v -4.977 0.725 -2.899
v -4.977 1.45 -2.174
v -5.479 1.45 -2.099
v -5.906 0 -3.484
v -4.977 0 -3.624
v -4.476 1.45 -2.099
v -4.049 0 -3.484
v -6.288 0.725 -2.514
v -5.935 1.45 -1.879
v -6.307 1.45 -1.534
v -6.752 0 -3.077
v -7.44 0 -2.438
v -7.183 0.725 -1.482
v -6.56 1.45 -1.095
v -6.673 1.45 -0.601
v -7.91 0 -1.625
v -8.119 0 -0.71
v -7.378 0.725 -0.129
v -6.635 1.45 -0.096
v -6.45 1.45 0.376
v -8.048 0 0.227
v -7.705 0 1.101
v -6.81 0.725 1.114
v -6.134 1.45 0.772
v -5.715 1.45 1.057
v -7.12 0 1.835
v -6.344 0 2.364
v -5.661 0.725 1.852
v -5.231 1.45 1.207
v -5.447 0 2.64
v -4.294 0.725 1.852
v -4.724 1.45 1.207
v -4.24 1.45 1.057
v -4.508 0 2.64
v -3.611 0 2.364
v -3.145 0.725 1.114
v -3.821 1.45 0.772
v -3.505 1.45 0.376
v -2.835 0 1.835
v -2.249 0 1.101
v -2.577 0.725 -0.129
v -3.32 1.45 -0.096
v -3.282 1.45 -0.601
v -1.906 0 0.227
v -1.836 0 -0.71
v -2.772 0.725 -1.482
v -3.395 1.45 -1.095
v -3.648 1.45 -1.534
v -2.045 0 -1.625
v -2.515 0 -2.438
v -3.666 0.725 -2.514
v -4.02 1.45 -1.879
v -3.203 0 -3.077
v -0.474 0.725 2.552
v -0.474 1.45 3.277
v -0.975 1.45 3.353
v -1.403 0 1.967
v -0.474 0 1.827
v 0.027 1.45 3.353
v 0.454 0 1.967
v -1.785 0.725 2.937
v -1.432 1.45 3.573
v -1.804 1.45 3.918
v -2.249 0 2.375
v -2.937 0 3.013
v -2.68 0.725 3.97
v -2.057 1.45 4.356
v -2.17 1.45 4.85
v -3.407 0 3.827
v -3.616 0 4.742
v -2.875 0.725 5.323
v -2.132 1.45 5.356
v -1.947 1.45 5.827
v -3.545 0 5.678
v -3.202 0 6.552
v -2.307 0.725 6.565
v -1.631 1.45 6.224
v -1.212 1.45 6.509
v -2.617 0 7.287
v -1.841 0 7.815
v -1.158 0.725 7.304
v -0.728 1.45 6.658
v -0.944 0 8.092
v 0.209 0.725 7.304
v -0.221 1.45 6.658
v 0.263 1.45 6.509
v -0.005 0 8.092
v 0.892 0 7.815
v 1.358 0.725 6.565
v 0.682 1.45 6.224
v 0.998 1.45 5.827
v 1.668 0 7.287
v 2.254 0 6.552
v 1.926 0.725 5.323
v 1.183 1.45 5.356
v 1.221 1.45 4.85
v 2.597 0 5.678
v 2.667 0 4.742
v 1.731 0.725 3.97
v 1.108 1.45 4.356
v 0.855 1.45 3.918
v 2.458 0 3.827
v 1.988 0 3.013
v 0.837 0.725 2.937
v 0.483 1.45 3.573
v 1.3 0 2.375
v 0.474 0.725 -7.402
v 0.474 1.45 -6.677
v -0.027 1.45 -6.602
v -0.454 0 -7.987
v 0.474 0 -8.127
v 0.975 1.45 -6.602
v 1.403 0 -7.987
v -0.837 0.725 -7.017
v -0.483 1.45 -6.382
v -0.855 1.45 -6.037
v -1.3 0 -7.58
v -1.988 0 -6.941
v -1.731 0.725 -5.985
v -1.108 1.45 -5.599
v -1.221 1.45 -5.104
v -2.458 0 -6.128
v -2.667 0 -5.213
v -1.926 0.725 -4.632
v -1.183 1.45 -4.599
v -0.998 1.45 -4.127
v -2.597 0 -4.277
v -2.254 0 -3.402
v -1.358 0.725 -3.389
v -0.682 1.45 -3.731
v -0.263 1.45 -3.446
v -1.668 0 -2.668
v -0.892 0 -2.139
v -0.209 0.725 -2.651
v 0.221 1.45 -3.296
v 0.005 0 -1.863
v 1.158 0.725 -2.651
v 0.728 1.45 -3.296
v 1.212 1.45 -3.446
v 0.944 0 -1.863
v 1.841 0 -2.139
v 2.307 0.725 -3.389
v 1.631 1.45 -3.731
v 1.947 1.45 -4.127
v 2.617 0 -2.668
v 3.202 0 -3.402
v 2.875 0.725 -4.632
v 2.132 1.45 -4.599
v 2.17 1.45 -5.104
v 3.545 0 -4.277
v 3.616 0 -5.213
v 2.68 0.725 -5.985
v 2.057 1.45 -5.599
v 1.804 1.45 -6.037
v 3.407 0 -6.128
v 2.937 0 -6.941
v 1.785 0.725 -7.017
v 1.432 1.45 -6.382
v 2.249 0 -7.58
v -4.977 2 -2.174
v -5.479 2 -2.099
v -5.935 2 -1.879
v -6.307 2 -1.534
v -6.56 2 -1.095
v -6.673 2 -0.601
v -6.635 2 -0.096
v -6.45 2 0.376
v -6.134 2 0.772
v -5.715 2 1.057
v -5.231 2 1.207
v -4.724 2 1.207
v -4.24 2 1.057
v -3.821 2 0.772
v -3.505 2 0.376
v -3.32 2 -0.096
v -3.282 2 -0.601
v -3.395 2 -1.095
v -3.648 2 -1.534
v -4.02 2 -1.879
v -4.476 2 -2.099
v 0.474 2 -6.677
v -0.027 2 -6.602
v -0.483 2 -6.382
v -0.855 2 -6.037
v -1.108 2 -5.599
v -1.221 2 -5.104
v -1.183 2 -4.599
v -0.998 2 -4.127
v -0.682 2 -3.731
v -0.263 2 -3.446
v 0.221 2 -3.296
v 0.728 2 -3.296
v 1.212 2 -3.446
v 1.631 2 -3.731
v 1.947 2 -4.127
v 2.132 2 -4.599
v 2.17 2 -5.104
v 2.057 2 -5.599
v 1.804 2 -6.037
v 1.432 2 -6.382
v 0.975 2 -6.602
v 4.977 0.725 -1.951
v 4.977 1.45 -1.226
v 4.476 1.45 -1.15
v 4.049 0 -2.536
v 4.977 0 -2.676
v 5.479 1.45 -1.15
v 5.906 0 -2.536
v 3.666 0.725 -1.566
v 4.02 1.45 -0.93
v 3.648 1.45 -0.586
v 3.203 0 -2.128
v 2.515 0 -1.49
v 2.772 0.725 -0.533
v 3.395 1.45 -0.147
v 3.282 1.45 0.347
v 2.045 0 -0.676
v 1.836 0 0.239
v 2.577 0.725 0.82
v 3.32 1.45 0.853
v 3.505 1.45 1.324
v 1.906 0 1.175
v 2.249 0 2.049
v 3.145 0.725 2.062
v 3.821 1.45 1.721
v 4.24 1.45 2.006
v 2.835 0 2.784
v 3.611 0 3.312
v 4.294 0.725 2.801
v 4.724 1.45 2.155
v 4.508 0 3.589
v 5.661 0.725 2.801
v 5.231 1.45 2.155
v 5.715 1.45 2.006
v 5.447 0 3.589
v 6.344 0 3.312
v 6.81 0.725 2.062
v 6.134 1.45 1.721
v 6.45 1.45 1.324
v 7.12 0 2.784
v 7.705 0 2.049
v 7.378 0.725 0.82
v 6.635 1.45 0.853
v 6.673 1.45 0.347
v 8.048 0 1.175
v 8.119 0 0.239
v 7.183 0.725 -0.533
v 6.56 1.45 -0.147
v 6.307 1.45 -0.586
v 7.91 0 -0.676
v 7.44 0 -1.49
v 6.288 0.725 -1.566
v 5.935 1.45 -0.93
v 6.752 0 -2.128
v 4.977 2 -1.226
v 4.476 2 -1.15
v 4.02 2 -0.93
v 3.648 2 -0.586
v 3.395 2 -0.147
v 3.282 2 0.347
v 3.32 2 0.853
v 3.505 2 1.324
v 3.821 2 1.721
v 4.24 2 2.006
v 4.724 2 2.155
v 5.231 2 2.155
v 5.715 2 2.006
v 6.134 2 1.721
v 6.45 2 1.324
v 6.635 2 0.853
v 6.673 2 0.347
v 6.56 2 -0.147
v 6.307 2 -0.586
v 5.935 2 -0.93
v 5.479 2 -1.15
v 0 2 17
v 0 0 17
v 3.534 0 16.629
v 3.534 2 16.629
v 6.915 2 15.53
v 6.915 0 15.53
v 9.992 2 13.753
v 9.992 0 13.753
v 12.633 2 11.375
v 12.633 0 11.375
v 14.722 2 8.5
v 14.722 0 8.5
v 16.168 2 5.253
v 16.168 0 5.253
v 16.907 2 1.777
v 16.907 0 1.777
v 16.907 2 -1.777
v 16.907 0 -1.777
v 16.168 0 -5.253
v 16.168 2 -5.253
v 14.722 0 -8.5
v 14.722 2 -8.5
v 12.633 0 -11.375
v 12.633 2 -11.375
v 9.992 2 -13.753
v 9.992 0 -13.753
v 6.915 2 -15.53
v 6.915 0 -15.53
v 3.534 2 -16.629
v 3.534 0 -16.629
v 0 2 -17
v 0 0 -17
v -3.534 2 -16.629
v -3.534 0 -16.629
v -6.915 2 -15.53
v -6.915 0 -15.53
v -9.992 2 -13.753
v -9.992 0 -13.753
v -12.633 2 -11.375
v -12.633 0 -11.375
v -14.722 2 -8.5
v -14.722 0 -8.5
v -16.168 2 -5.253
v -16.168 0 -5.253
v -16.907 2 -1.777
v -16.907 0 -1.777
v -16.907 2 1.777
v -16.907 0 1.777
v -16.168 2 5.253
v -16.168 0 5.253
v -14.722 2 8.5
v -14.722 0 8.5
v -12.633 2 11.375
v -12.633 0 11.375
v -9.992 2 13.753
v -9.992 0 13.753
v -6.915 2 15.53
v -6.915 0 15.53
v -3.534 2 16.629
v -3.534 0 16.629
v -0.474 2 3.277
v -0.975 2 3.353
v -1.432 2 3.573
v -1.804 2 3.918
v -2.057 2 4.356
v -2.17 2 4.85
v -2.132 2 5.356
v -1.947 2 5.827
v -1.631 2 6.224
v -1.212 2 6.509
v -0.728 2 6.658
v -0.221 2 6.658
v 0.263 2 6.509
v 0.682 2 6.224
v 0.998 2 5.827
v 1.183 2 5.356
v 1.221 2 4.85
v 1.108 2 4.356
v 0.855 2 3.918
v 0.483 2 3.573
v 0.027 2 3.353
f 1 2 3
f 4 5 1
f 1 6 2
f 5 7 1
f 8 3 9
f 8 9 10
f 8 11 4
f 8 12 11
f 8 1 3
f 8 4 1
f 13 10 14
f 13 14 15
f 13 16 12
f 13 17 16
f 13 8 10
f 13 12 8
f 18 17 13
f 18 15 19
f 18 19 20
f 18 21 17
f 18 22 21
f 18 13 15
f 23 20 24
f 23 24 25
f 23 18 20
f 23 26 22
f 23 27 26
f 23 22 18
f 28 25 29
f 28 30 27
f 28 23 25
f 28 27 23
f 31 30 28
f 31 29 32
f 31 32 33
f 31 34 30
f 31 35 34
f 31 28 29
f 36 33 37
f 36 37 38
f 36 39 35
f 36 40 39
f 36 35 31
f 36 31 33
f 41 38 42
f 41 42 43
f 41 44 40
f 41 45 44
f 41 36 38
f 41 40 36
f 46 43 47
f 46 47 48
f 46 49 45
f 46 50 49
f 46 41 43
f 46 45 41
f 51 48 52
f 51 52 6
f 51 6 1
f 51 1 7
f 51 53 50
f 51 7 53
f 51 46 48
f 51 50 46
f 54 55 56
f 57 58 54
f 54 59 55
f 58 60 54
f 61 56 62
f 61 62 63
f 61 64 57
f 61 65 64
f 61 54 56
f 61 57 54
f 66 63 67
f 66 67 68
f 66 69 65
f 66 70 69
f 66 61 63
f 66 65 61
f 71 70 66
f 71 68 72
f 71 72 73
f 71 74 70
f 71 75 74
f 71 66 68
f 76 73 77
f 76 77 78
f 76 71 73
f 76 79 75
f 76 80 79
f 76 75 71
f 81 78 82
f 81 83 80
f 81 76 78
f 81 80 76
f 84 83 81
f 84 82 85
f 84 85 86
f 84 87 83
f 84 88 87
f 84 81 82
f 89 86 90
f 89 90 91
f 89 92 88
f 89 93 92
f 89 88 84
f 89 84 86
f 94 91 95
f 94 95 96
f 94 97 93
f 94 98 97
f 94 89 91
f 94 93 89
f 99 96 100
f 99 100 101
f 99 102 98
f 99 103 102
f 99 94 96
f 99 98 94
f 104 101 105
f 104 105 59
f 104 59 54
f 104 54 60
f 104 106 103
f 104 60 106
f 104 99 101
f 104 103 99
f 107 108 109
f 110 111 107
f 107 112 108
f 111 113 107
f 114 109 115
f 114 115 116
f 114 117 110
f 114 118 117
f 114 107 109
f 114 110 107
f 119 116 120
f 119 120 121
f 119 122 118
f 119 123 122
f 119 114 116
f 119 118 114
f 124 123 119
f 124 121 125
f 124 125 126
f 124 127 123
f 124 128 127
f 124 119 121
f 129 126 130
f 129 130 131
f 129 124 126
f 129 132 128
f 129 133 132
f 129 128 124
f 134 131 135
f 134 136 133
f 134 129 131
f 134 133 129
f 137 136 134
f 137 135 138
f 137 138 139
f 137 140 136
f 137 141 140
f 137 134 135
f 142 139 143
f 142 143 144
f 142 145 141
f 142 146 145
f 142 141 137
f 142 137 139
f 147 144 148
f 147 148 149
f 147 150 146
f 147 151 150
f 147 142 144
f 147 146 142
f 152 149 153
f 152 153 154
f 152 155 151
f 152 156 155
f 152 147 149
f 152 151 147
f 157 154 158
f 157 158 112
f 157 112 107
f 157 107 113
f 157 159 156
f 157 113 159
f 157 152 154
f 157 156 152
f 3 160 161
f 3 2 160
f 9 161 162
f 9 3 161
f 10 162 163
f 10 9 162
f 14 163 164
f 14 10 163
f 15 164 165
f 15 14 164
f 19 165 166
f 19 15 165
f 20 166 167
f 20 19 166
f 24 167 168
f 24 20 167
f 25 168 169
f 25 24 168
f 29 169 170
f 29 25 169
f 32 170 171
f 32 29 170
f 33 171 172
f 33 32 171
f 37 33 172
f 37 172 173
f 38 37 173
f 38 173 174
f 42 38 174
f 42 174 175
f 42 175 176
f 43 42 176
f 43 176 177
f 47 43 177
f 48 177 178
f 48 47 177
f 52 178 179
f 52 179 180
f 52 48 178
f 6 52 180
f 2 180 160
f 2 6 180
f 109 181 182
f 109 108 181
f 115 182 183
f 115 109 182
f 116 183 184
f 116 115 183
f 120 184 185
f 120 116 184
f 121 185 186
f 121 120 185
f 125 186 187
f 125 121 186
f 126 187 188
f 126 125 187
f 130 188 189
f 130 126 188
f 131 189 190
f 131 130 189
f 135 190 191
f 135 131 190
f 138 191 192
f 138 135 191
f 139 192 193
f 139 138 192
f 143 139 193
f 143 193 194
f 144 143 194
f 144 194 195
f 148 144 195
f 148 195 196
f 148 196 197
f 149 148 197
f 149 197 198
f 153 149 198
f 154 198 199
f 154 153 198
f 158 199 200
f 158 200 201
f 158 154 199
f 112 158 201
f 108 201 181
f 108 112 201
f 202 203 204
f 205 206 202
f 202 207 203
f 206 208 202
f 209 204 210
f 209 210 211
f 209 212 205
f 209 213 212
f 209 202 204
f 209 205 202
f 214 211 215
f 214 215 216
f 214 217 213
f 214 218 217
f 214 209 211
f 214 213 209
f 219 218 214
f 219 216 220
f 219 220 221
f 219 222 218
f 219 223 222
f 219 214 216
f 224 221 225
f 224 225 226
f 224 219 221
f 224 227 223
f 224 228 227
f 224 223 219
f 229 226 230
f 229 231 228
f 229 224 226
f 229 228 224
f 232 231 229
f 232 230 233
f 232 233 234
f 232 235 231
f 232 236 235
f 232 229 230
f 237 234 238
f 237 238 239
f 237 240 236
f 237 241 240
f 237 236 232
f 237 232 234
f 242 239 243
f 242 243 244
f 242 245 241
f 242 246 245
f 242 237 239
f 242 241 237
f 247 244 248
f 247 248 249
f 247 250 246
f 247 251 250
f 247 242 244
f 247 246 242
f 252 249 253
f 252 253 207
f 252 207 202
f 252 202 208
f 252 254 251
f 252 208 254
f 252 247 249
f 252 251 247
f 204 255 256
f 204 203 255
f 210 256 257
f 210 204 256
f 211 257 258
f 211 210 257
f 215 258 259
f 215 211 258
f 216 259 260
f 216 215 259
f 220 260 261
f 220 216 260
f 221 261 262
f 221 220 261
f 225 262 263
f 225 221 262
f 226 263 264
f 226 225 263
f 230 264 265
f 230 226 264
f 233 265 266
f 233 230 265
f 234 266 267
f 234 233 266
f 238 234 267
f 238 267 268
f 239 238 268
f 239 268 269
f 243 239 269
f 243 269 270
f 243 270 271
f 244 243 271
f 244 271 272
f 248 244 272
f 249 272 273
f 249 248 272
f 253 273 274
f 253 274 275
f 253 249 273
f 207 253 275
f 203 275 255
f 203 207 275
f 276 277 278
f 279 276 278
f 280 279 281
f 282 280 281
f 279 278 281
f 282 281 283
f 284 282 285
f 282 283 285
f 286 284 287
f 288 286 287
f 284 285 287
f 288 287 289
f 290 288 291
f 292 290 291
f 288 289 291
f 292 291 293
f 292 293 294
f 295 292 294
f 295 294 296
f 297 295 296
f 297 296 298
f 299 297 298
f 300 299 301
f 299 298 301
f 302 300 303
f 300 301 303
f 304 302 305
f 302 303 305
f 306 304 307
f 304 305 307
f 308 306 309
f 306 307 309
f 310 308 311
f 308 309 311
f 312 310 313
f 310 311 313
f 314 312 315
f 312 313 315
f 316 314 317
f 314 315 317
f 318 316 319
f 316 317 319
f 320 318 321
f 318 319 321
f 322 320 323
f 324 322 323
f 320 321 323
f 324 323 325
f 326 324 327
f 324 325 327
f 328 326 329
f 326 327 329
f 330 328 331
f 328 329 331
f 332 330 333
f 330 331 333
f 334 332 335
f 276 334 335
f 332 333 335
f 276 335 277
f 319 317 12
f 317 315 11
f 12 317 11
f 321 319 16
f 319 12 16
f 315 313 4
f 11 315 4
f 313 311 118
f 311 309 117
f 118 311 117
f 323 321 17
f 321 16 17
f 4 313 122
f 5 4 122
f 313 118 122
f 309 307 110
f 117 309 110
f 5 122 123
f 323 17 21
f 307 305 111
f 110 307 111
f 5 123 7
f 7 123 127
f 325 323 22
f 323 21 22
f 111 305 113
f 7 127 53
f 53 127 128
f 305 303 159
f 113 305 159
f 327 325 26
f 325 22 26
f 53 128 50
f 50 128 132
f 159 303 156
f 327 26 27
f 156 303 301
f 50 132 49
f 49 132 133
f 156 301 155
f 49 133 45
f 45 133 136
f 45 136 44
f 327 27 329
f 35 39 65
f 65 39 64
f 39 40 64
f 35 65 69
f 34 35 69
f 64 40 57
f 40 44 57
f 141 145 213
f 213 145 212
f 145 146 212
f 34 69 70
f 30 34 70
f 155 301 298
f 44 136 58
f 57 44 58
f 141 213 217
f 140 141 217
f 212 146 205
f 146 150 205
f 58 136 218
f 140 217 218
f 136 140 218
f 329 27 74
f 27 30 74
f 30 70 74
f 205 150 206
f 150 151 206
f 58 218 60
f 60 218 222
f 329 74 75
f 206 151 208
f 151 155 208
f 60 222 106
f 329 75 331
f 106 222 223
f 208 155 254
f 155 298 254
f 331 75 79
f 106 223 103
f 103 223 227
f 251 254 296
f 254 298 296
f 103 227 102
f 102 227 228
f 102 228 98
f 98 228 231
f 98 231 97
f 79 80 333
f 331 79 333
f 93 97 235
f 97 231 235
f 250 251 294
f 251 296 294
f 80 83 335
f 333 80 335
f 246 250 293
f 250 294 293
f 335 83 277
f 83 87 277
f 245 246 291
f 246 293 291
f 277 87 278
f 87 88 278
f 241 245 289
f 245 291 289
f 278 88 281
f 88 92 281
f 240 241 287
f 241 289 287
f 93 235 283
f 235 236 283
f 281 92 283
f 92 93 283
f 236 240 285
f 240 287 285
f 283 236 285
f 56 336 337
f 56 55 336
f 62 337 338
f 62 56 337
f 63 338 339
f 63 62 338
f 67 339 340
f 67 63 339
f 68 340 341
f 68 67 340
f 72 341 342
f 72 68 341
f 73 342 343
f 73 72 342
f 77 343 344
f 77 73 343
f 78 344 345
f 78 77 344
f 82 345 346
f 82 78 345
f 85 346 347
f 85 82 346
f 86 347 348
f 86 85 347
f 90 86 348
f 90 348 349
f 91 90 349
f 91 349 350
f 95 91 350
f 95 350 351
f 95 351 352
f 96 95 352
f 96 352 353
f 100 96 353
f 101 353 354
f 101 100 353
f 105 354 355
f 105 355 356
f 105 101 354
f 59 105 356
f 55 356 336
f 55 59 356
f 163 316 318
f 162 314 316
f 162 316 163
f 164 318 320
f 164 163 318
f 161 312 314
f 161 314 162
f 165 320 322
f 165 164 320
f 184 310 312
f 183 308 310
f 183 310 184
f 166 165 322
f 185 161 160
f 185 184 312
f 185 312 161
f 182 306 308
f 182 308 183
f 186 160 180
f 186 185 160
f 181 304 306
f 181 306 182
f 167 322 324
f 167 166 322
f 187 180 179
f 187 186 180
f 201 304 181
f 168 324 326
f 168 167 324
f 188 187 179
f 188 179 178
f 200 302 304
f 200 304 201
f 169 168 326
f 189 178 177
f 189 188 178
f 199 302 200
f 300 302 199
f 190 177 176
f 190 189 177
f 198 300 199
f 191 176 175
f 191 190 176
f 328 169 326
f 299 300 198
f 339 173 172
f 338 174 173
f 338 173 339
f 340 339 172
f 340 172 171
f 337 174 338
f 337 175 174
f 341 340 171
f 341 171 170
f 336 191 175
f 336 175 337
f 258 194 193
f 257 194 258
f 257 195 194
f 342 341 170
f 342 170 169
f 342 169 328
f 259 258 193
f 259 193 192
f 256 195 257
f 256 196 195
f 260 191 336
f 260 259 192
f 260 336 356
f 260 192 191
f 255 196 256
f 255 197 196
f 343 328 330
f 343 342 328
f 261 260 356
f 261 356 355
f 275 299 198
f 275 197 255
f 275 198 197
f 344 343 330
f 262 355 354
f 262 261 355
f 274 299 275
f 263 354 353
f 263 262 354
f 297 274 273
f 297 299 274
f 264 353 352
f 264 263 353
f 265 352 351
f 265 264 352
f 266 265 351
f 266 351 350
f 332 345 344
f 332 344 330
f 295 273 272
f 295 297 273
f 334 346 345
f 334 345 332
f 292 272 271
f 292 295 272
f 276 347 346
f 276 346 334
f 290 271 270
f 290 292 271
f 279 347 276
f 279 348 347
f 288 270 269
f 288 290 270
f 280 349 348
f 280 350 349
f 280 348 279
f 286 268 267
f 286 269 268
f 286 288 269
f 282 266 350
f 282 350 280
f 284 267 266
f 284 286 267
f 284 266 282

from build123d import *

# Parameters (mm, degrees)
SKETCH1_R                                    = 17
BOSS_EXTRUDE1_DEPTH                          = 2
CSK_FOR_M3_COUNTERSUNK_FLAT_HEAD_SCR_2_COUNT = 2
CSK_FOR_M3_COUNTERSUNK_FLAT_HEAD_SCR_2_PITCH = 7.071067812
CSK_FOR_M3_COUNTERSUNK_FLAT_HEAD_SCR_3_COUNT = 2
CSK_FOR_M3_COUNTERSUNK_FLAT_HEAD_SCR_3_PITCH = 10
CSK_FOR_M3_COUNTERSUNK_FLAT_HEAD_SCR_4_COUNT = 2
CSK_FOR_M3_COUNTERSUNK_FLAT_HEAD_SCR_4_PITCH = 7.071067812


with BuildPart() as part:
    # Sketch1 → Boss-Extrude1 (new body)
    with BuildSketch(Plane(origin=(0, 0, 0), x_dir=(1, 0, 0), z_dir=(0, 1, 0))):
        with Locations(Location((0, 0, 0), (0, 0, 270))):
            Circle(SKETCH1_R)
    extrude(amount=BOSS_EXTRUDE1_DEPTH)

    # Sketch3 → CSK for M3 Countersunk Flat Head Screw1 (revolve, cut)
    with BuildSketch(Plane(origin=(-4.977444323, 0, -0.474392252), x_dir=(0, 0, -1), z_dir=(1, 0, 0))):
        Polygon((0, 0), (0, 2), (1.7, 2), (1.7, 1.45), (3.15, 0), align=None)
    csk_for_m3_countersunk_flat_head_screw1 = revolve(axis=Axis((-4.977444323, -6.35, -0.474392252), (0, 1, 0)), mode=Mode.SUBTRACT)

    # CSK for M3 Countersunk Flat Head Scr 2: CSK for M3 Countersunk Flat Head Screw1 ×2
    with Locations(*[Vector(0.7710061224307119, 0, -0.6368277311599726) * (i * CSK_FOR_M3_COUNTERSUNK_FLAT_HEAD_SCR_2_PITCH) for i in range(1, CSK_FOR_M3_COUNTERSUNK_FLAT_HEAD_SCR_2_COUNT)]):
        add(csk_for_m3_countersunk_flat_head_screw1, mode=Mode.SUBTRACT)

    # CSK for M3 Countersunk Flat Head Scr 3: CSK for M3 Countersunk Flat Head Screw1 ×2
    with Locations(*[Vector(0.995488864657962, 0, 0.09487845035624153) * (i * CSK_FOR_M3_COUNTERSUNK_FLAT_HEAD_SCR_3_PITCH) for i in range(1, CSK_FOR_M3_COUNTERSUNK_FLAT_HEAD_SCR_3_COUNT)]):
        add(csk_for_m3_countersunk_flat_head_screw1, mode=Mode.SUBTRACT)

    # CSK for M3 Countersunk Flat Head Scr 4: CSK for M3 Countersunk Flat Head Screw1 ×2
    with Locations(*[Vector(0.6368277311599727, 0, 0.7710061224307118) * (i * CSK_FOR_M3_COUNTERSUNK_FLAT_HEAD_SCR_4_PITCH) for i in range(1, CSK_FOR_M3_COUNTERSUNK_FLAT_HEAD_SCR_4_COUNT)]):
        add(csk_for_m3_countersunk_flat_head_screw1, mode=Mode.SUBTRACT)


solid = part.part
